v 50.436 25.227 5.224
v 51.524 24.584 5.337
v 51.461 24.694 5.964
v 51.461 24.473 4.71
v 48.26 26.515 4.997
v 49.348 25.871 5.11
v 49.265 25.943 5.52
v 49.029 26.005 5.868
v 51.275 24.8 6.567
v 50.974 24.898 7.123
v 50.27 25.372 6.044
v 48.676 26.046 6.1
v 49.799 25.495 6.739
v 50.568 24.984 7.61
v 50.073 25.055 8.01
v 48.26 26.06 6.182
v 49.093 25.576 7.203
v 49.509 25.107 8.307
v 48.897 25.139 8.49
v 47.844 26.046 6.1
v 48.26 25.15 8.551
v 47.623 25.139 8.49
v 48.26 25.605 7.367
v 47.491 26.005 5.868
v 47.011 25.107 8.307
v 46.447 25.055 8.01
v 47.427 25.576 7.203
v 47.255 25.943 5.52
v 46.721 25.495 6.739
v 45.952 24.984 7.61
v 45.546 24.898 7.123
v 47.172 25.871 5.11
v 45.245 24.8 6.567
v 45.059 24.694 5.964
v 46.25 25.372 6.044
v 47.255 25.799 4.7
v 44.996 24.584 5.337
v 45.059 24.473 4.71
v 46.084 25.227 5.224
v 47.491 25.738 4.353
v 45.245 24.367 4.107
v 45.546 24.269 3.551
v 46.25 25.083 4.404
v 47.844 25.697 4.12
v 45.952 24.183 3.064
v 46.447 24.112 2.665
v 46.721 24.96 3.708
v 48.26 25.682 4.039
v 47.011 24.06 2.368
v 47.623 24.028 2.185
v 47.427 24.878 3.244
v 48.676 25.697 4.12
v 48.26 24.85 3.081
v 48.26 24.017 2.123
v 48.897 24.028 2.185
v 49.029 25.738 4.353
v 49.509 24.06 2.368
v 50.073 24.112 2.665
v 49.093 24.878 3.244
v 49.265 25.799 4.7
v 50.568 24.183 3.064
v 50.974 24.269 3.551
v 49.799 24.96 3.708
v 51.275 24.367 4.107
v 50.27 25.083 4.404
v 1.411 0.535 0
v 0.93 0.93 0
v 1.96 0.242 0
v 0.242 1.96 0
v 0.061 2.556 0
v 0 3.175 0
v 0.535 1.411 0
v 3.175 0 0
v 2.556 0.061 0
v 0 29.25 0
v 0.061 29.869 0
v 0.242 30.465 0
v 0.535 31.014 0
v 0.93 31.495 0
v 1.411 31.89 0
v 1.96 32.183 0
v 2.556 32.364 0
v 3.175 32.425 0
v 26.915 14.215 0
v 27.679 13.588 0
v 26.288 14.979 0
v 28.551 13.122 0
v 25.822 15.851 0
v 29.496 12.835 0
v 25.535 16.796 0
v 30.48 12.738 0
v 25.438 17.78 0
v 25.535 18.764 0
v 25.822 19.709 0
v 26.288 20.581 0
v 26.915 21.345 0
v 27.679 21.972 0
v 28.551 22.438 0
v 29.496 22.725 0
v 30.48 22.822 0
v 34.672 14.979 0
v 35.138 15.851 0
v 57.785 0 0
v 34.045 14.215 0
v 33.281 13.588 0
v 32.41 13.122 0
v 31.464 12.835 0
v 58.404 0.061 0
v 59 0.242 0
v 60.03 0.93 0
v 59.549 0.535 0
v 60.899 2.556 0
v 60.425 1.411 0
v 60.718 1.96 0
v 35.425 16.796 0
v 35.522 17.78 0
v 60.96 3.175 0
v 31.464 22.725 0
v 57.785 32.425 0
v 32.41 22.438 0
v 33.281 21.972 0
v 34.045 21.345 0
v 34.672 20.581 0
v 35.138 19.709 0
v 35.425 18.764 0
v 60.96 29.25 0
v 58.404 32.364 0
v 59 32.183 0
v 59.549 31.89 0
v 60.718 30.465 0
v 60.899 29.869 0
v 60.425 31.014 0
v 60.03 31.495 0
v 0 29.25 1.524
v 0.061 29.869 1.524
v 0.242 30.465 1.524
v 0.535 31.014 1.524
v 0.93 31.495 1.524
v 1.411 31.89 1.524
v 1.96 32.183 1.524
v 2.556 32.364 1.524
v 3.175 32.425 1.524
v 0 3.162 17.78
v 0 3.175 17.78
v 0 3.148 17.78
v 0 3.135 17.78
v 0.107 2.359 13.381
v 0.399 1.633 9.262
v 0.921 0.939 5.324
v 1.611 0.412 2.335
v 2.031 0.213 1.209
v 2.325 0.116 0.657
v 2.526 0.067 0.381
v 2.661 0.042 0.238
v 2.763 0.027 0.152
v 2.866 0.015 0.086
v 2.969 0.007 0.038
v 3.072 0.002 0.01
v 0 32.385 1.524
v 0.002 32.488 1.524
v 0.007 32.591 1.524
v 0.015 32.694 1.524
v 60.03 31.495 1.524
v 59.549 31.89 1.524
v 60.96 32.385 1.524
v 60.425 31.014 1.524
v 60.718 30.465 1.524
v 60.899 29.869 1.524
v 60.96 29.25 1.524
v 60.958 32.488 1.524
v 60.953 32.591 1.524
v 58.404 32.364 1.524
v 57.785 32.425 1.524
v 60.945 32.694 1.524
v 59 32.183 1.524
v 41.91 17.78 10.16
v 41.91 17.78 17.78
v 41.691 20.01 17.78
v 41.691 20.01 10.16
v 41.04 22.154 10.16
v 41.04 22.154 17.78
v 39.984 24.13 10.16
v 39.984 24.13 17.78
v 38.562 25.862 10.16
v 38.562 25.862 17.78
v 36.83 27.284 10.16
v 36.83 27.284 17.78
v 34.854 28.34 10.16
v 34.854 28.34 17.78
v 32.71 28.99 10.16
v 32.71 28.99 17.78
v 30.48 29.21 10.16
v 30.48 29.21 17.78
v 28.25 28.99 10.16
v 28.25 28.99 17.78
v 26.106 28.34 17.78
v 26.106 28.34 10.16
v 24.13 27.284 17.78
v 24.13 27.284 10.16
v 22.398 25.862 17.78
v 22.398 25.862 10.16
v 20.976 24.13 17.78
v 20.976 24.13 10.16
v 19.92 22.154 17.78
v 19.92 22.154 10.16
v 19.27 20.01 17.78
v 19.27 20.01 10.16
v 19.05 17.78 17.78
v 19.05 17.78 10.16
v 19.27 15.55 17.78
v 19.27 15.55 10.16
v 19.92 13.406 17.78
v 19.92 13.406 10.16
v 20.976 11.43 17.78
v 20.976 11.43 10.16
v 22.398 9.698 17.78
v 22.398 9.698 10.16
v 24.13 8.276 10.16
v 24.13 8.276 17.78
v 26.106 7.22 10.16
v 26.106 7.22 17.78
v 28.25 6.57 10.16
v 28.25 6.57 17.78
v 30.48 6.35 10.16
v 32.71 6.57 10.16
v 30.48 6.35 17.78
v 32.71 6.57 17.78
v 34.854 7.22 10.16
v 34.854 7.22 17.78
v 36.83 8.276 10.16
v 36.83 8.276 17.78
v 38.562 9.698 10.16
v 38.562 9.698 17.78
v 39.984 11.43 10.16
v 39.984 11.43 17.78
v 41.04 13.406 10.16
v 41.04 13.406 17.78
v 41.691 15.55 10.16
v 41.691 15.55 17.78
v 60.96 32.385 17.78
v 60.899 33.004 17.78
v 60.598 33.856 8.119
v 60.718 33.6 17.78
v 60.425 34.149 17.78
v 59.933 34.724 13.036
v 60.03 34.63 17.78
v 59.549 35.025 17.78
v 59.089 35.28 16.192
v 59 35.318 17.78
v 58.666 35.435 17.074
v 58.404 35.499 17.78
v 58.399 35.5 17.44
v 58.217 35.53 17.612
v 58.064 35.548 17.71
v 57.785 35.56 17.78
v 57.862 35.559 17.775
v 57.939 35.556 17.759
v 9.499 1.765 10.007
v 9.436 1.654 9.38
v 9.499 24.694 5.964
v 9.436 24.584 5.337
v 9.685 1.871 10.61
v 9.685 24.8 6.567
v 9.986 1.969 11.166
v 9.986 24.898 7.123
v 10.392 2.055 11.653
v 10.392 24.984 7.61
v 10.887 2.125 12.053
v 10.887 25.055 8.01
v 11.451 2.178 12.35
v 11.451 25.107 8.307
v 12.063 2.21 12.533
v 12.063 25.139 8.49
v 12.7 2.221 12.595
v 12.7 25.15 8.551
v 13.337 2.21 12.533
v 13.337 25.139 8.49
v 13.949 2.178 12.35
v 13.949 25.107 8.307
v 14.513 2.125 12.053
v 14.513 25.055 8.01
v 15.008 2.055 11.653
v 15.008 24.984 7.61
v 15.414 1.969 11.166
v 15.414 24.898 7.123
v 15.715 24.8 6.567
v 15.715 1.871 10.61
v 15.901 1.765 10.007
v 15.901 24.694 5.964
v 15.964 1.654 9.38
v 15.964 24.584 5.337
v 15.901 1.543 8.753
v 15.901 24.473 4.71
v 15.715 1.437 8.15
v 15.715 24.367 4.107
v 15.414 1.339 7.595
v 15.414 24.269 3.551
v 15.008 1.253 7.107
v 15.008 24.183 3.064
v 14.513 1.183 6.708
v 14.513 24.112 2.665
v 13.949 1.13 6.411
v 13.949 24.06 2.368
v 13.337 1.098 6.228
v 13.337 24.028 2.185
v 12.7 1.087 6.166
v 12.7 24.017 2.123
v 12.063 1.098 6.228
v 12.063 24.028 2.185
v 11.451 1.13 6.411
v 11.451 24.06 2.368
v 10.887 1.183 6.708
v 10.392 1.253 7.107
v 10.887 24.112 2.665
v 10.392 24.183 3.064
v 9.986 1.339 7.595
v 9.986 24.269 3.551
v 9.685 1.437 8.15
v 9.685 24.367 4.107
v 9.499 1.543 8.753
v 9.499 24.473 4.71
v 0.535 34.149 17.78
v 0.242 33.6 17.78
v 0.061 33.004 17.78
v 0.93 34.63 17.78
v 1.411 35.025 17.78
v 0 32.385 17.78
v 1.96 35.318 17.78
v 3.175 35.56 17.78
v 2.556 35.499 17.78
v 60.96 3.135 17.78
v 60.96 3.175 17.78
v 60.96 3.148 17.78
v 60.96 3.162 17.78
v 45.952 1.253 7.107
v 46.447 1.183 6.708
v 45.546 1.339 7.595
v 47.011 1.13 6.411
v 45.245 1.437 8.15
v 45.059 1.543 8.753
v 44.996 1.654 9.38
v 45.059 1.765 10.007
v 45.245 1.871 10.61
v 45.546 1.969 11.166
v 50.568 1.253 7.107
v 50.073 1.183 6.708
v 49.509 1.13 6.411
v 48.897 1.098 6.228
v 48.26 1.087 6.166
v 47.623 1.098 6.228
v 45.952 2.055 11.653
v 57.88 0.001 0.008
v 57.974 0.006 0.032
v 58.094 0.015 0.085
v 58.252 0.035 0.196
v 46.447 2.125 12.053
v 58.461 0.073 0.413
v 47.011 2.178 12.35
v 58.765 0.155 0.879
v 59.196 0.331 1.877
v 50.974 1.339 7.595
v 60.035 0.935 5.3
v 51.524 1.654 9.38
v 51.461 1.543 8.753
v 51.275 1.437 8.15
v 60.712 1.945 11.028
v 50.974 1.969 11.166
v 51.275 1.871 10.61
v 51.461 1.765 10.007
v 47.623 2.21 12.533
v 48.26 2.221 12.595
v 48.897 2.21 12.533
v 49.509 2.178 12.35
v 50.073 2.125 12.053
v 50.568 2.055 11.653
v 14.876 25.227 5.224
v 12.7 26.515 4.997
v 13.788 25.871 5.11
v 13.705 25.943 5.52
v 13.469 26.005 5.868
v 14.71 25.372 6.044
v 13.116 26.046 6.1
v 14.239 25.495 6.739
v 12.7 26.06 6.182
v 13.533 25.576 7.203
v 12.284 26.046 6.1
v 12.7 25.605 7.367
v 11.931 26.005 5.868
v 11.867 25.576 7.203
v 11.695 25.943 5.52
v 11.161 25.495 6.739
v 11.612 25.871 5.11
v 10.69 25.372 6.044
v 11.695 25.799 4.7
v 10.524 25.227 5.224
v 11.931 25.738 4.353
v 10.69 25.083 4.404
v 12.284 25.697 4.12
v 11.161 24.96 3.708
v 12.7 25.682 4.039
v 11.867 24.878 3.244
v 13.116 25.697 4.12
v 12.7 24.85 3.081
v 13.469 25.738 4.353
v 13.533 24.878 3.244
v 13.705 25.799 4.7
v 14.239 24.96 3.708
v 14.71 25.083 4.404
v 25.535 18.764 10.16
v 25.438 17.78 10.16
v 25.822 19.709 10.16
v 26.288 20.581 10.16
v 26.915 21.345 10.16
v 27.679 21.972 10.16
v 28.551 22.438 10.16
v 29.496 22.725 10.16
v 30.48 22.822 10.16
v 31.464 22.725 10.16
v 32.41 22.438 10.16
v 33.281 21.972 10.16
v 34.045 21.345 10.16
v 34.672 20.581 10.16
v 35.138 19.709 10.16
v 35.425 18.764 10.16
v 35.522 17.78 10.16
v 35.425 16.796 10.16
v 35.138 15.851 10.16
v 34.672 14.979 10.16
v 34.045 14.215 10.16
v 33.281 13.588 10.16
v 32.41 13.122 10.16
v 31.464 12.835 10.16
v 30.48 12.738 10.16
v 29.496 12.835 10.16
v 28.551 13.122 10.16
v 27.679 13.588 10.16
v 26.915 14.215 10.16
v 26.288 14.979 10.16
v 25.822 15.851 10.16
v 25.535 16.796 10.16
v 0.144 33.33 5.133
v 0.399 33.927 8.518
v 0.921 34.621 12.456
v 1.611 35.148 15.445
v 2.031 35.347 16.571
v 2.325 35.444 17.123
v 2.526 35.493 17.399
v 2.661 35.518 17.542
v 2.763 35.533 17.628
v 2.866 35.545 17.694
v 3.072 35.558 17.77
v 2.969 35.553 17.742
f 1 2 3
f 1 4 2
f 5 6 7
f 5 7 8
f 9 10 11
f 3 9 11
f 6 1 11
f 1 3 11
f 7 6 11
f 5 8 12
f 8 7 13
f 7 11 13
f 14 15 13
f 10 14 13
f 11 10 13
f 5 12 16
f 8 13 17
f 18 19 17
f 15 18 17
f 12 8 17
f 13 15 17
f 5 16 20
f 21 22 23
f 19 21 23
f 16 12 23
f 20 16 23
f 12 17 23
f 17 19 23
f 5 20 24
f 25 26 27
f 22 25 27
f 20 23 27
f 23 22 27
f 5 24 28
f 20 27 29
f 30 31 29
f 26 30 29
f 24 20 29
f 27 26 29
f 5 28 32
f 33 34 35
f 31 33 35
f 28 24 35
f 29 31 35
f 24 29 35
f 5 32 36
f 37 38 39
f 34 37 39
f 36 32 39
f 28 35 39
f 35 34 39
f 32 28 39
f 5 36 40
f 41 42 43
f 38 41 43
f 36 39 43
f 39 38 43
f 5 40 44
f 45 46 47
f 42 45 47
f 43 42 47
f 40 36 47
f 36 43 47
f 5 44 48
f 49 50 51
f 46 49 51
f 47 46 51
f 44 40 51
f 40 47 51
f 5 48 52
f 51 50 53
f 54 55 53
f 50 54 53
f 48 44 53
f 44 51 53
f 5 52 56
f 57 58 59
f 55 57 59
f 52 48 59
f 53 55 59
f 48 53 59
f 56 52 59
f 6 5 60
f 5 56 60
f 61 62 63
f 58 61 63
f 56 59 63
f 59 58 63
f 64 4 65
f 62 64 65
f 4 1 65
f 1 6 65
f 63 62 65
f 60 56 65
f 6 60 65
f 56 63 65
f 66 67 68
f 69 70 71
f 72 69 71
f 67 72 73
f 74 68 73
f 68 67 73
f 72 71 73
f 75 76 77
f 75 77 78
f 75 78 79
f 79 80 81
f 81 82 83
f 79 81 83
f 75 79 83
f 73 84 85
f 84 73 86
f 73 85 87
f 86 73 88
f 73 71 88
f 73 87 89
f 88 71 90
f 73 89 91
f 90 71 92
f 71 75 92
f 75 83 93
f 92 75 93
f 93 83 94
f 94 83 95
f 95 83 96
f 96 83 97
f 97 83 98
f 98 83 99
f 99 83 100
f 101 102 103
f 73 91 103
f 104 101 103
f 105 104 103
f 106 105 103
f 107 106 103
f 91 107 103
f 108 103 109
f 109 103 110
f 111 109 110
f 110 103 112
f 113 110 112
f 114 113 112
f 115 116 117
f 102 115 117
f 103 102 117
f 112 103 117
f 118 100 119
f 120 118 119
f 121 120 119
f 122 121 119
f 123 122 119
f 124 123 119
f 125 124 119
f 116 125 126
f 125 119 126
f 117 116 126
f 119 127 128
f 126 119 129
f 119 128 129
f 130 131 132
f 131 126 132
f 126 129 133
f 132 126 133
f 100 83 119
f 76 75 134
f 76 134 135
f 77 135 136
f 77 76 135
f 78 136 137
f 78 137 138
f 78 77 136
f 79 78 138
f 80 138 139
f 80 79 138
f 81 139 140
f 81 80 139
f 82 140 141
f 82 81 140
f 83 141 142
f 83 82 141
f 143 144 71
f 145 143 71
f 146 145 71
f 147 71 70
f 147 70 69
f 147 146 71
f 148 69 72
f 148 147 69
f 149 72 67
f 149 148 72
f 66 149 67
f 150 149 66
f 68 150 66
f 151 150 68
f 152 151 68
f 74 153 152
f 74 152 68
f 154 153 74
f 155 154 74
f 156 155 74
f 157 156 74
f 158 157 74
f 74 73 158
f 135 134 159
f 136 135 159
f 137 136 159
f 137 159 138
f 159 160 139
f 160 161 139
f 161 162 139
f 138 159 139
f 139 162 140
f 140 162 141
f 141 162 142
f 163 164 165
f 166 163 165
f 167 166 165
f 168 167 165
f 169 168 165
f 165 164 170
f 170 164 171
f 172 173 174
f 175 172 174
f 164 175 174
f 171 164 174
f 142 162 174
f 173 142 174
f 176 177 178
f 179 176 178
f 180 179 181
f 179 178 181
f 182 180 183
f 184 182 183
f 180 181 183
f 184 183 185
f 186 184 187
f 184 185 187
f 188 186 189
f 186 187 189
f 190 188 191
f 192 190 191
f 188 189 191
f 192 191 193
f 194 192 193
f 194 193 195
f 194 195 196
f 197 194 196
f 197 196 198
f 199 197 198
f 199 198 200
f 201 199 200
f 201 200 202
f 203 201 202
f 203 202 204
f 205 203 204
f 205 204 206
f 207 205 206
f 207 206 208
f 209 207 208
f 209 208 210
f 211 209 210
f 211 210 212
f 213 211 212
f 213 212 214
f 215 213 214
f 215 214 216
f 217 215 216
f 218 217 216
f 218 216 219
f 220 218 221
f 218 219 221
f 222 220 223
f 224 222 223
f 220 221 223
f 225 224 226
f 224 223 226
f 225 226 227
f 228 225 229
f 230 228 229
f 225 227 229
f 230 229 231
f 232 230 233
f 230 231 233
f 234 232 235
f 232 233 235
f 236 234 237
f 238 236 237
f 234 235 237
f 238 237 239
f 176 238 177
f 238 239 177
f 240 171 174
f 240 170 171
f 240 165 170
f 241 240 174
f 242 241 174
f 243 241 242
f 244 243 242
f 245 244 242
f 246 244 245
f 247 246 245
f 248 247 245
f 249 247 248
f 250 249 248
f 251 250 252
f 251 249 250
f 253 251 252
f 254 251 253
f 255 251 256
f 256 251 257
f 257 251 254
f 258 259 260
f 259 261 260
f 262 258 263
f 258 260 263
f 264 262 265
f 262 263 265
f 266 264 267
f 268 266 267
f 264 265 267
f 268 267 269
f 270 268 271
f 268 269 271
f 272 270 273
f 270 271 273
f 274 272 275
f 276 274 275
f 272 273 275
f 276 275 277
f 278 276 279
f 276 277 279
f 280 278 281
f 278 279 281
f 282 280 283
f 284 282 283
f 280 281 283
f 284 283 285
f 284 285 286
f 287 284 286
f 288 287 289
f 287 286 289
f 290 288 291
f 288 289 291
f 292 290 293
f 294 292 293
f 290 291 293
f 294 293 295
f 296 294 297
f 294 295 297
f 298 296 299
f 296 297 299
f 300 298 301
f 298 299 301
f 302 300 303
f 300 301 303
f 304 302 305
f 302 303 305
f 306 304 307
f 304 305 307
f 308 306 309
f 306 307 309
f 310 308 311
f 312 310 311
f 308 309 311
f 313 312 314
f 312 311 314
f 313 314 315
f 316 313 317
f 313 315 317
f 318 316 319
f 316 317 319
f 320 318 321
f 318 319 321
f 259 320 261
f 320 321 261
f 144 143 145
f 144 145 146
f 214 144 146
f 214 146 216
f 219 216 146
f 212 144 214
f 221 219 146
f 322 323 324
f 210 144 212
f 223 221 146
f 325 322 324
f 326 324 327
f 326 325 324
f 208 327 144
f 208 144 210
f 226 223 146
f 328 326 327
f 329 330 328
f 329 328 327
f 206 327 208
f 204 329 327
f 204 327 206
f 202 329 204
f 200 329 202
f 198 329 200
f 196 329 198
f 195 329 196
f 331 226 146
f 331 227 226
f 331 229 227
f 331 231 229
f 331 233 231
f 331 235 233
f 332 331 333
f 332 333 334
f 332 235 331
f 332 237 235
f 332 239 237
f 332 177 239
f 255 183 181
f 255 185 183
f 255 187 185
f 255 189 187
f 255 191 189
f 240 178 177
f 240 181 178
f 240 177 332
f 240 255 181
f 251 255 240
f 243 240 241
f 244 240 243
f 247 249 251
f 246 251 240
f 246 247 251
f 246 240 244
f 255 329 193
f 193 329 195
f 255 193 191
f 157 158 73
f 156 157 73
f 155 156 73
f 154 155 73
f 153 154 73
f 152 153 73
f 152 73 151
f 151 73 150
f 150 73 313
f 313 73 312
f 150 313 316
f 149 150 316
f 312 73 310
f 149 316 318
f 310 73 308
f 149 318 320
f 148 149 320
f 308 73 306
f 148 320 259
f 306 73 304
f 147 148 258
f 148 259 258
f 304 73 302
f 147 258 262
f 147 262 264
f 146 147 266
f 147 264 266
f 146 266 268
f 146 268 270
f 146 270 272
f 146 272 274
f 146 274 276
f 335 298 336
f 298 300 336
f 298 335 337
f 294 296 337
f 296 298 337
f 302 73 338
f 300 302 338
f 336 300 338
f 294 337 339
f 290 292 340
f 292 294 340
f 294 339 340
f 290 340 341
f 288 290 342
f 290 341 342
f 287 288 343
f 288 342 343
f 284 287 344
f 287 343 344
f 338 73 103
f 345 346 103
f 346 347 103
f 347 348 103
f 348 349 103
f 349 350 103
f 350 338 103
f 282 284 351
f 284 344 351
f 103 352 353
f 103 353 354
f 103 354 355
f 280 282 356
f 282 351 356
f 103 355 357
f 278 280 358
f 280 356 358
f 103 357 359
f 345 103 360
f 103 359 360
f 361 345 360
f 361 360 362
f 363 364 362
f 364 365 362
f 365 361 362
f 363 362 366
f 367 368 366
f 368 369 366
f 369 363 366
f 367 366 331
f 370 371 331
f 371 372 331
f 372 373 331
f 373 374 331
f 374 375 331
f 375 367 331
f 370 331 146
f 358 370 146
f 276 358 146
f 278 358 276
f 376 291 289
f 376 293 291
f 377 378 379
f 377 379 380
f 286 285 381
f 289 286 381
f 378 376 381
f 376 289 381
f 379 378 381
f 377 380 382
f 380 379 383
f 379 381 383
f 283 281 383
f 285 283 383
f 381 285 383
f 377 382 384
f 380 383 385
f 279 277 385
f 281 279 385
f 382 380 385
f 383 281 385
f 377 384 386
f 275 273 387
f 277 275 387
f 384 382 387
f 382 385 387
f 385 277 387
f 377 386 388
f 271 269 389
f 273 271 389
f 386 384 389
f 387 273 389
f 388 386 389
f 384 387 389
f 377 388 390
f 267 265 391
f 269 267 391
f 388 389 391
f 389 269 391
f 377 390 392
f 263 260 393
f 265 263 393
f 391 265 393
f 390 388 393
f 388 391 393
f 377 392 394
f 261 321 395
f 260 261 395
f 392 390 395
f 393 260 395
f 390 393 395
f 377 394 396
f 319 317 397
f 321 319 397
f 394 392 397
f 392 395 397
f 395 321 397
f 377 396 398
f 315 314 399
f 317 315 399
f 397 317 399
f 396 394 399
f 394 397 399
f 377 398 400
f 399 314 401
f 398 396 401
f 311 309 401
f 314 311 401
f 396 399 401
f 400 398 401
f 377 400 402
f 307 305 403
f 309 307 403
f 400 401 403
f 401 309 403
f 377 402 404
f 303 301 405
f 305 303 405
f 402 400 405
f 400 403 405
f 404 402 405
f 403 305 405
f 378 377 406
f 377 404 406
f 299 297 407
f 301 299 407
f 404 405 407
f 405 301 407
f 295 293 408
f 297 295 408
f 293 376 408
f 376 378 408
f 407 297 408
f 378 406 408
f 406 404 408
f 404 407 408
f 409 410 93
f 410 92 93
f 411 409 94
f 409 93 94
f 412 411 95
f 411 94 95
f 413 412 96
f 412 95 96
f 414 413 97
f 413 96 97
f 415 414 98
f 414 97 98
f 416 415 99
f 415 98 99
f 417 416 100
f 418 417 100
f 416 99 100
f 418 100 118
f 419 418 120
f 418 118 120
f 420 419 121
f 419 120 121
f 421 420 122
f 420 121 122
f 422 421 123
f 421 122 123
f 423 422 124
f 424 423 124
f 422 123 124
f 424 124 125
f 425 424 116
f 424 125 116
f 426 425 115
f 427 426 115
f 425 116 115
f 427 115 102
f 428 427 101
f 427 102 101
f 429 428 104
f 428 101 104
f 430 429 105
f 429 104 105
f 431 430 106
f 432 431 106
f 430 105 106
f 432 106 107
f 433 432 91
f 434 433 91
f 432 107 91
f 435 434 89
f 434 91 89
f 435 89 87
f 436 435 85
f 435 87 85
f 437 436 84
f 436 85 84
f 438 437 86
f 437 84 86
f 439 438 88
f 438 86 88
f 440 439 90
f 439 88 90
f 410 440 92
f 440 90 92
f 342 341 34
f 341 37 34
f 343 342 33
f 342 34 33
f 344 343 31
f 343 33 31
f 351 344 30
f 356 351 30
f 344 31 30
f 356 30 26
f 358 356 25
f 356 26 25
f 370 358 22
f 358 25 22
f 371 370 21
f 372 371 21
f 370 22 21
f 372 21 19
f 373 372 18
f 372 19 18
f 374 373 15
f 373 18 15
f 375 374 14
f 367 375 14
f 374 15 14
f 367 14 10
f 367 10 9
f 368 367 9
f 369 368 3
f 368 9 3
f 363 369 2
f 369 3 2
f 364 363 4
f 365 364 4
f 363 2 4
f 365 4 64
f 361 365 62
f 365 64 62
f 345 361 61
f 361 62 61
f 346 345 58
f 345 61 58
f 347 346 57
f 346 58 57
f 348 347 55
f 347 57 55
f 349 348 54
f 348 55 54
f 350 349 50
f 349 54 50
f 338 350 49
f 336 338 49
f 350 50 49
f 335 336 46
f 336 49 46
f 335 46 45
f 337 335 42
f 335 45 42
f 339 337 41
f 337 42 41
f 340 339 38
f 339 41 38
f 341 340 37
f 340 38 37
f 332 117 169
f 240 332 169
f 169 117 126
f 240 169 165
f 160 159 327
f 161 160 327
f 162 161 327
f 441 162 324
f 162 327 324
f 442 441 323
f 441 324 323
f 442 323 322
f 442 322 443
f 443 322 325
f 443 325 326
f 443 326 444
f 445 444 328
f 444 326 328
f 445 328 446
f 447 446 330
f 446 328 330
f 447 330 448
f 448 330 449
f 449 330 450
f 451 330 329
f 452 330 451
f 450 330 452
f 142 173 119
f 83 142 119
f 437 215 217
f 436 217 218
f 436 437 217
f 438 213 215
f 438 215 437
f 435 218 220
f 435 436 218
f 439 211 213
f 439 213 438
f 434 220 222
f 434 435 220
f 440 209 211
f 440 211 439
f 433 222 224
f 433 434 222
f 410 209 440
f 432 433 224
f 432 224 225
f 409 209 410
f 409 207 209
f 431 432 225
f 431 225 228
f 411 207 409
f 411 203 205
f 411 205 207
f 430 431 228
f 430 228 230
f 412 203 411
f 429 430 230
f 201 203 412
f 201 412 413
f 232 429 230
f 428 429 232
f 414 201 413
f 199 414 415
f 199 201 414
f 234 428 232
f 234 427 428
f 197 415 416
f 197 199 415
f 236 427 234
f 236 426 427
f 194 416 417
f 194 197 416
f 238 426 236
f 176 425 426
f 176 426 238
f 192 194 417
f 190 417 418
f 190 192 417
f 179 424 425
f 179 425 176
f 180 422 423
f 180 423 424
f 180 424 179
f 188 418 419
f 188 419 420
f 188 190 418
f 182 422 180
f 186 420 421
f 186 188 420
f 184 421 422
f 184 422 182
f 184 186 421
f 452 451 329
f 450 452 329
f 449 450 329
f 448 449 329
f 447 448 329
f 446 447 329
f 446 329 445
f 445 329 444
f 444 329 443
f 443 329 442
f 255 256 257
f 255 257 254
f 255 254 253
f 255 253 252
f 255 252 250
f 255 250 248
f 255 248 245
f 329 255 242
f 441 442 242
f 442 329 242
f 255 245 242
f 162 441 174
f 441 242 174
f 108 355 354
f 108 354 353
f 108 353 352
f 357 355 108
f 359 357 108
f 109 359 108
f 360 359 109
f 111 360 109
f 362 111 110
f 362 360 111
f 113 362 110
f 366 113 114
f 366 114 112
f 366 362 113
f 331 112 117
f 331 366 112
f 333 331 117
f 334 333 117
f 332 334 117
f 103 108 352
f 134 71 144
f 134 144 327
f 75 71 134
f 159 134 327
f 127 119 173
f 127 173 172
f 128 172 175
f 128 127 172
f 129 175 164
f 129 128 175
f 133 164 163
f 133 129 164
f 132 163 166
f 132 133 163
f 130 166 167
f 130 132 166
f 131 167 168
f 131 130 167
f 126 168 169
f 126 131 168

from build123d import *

# Parameters (mm, degrees)
F0_W           = 60.96
F0_H           = 35.56
F1_DEPTH       = 17.78
F2_R           = 3.175
F4_DEPTH       = 60.961
F6_D           = 10.0838
F6_DEPTH       = 23.2918
F6_CBORE_D     = 22.86
F6_CBORE_DEPTH = 7.62
F6_TIP         = 3.0294791551
F7_T1_DEPTH    = 9.4615000248
F9_D           = 6.5278
F9_DEPTH       = 23.2833333333
F9_TIP         = 1.9611489744


# Not quite as in the source:
# - a fillet or chamfer that OpenCascade refuses, or shapes differently, is made with other operations: its cross-section is extruded or revolved along the edge and cut away or added
# - a feature names something its author has since deleted; it is built from what else it names


with BuildPart() as f1:
    # F0 (on Top) → F1 (new body)
    with BuildSketch(Plane.XY):
        with Locations((30.48, 17.78)):
            Rectangle(F0_W, F0_H)
    extrude(amount=F1_DEPTH)

    # F2
    f2_edges = [f1.edges().sort_by_distance(p)[0] for p in [
        (0, 0, 8.89),
        (60.96, 0, 8.89),
        (60.96, 35.56, 8.89),
        (0, 35.56, 8.89),
    ]]
    fillet(f2_edges, radius=F2_R)

    # F3 (on face) → F4 (cut, through all)
    with BuildSketch(Plane.YZ.offset(60.96)):
        Polygon((0, 17.78), (0, 0), (3.135093717, 17.78), align=None)
        Polygon((32.424906283, 1.524), (32.424906283, 0), (35.56, 0), (35.56, 17.78), (32.6936286016, 1.524), align=None)
    extrude(amount=-F4_DEPTH, mode=Mode.SUBTRACT)

    # F6
    with Locations(Plane.XY.offset(17.78)):
        with Locations((30.4801253996, 17.78)):
            CounterBoreHole(F6_D / 2, F6_CBORE_D / 2, F6_CBORE_DEPTH, depth=F6_DEPTH)
            with Locations((0, 0, -(F6_DEPTH + F6_TIP / 2))):  # 118° drill point
                Cone(0, F6_D / 2, F6_TIP, mode=Mode.SUBTRACT)

    # F7: fillet of radius 3.175 on 2 edges, made by hand

    # F7_s2 → F7_t1 (cut)
    with BuildSketch(Plane.XY.offset(-7.9375000248)):
        with BuildLine():
            ThreePointArc((57.785, 32.424906283), (60.0300640303, 31.4949703133), (60.96, 29.249906283))
            Line((60.96, 29.249906283), (61.2775, 29.249906283))
            ThreePointArc((61.2775, 29.249906283), (61.2775, 32.385), (61.277224121, 32.4288969113))
            Line((61.277224121, 32.4288969113), (60.9597492009, 32.742406283))
            Line((60.9597492009, 32.742406283), (57.785, 32.742406283))
            Line((57.785, 32.742406283), (57.785, 32.424906283))
        make_face()
        with BuildLine():
            ThreePointArc((0, 29.249906283), (0.9299359697, 31.4949703133), (3.175, 32.424906283))
            Line((3.175, 32.424906283), (3.175, 32.742406283))
            Line((3.175, 32.742406283), (0.0002507991, 32.742406283))
            Line((0.0002507991, 32.742406283), (-0.317224121, 32.4288969113))
            ThreePointArc((-0.317224121, 32.4288969113), (-0.3175, 32.385), (-0.3175, 29.249906283))
            Line((-0.3175, 29.249906283), (0, 29.249906283))
        make_face()
    extrude(amount=F7_T1_DEPTH, mode=Mode.SUBTRACT)

    # F9
    with Locations(Plane(origin=(0, 0, 0), x_dir=(1, 0, 0), z_dir=(0, -0.984807753, 0.1736481777))):
        with Locations((12.7, 9.525), (48.26, 9.525)):
            Hole(F9_D / 2, depth=F9_DEPTH)
            with Locations((0, 0, -(F9_DEPTH + F9_TIP / 2))):  # 118° drill point
                Cone(0, F9_D / 2, F9_TIP, mode=Mode.SUBTRACT)


solid = f1.part
